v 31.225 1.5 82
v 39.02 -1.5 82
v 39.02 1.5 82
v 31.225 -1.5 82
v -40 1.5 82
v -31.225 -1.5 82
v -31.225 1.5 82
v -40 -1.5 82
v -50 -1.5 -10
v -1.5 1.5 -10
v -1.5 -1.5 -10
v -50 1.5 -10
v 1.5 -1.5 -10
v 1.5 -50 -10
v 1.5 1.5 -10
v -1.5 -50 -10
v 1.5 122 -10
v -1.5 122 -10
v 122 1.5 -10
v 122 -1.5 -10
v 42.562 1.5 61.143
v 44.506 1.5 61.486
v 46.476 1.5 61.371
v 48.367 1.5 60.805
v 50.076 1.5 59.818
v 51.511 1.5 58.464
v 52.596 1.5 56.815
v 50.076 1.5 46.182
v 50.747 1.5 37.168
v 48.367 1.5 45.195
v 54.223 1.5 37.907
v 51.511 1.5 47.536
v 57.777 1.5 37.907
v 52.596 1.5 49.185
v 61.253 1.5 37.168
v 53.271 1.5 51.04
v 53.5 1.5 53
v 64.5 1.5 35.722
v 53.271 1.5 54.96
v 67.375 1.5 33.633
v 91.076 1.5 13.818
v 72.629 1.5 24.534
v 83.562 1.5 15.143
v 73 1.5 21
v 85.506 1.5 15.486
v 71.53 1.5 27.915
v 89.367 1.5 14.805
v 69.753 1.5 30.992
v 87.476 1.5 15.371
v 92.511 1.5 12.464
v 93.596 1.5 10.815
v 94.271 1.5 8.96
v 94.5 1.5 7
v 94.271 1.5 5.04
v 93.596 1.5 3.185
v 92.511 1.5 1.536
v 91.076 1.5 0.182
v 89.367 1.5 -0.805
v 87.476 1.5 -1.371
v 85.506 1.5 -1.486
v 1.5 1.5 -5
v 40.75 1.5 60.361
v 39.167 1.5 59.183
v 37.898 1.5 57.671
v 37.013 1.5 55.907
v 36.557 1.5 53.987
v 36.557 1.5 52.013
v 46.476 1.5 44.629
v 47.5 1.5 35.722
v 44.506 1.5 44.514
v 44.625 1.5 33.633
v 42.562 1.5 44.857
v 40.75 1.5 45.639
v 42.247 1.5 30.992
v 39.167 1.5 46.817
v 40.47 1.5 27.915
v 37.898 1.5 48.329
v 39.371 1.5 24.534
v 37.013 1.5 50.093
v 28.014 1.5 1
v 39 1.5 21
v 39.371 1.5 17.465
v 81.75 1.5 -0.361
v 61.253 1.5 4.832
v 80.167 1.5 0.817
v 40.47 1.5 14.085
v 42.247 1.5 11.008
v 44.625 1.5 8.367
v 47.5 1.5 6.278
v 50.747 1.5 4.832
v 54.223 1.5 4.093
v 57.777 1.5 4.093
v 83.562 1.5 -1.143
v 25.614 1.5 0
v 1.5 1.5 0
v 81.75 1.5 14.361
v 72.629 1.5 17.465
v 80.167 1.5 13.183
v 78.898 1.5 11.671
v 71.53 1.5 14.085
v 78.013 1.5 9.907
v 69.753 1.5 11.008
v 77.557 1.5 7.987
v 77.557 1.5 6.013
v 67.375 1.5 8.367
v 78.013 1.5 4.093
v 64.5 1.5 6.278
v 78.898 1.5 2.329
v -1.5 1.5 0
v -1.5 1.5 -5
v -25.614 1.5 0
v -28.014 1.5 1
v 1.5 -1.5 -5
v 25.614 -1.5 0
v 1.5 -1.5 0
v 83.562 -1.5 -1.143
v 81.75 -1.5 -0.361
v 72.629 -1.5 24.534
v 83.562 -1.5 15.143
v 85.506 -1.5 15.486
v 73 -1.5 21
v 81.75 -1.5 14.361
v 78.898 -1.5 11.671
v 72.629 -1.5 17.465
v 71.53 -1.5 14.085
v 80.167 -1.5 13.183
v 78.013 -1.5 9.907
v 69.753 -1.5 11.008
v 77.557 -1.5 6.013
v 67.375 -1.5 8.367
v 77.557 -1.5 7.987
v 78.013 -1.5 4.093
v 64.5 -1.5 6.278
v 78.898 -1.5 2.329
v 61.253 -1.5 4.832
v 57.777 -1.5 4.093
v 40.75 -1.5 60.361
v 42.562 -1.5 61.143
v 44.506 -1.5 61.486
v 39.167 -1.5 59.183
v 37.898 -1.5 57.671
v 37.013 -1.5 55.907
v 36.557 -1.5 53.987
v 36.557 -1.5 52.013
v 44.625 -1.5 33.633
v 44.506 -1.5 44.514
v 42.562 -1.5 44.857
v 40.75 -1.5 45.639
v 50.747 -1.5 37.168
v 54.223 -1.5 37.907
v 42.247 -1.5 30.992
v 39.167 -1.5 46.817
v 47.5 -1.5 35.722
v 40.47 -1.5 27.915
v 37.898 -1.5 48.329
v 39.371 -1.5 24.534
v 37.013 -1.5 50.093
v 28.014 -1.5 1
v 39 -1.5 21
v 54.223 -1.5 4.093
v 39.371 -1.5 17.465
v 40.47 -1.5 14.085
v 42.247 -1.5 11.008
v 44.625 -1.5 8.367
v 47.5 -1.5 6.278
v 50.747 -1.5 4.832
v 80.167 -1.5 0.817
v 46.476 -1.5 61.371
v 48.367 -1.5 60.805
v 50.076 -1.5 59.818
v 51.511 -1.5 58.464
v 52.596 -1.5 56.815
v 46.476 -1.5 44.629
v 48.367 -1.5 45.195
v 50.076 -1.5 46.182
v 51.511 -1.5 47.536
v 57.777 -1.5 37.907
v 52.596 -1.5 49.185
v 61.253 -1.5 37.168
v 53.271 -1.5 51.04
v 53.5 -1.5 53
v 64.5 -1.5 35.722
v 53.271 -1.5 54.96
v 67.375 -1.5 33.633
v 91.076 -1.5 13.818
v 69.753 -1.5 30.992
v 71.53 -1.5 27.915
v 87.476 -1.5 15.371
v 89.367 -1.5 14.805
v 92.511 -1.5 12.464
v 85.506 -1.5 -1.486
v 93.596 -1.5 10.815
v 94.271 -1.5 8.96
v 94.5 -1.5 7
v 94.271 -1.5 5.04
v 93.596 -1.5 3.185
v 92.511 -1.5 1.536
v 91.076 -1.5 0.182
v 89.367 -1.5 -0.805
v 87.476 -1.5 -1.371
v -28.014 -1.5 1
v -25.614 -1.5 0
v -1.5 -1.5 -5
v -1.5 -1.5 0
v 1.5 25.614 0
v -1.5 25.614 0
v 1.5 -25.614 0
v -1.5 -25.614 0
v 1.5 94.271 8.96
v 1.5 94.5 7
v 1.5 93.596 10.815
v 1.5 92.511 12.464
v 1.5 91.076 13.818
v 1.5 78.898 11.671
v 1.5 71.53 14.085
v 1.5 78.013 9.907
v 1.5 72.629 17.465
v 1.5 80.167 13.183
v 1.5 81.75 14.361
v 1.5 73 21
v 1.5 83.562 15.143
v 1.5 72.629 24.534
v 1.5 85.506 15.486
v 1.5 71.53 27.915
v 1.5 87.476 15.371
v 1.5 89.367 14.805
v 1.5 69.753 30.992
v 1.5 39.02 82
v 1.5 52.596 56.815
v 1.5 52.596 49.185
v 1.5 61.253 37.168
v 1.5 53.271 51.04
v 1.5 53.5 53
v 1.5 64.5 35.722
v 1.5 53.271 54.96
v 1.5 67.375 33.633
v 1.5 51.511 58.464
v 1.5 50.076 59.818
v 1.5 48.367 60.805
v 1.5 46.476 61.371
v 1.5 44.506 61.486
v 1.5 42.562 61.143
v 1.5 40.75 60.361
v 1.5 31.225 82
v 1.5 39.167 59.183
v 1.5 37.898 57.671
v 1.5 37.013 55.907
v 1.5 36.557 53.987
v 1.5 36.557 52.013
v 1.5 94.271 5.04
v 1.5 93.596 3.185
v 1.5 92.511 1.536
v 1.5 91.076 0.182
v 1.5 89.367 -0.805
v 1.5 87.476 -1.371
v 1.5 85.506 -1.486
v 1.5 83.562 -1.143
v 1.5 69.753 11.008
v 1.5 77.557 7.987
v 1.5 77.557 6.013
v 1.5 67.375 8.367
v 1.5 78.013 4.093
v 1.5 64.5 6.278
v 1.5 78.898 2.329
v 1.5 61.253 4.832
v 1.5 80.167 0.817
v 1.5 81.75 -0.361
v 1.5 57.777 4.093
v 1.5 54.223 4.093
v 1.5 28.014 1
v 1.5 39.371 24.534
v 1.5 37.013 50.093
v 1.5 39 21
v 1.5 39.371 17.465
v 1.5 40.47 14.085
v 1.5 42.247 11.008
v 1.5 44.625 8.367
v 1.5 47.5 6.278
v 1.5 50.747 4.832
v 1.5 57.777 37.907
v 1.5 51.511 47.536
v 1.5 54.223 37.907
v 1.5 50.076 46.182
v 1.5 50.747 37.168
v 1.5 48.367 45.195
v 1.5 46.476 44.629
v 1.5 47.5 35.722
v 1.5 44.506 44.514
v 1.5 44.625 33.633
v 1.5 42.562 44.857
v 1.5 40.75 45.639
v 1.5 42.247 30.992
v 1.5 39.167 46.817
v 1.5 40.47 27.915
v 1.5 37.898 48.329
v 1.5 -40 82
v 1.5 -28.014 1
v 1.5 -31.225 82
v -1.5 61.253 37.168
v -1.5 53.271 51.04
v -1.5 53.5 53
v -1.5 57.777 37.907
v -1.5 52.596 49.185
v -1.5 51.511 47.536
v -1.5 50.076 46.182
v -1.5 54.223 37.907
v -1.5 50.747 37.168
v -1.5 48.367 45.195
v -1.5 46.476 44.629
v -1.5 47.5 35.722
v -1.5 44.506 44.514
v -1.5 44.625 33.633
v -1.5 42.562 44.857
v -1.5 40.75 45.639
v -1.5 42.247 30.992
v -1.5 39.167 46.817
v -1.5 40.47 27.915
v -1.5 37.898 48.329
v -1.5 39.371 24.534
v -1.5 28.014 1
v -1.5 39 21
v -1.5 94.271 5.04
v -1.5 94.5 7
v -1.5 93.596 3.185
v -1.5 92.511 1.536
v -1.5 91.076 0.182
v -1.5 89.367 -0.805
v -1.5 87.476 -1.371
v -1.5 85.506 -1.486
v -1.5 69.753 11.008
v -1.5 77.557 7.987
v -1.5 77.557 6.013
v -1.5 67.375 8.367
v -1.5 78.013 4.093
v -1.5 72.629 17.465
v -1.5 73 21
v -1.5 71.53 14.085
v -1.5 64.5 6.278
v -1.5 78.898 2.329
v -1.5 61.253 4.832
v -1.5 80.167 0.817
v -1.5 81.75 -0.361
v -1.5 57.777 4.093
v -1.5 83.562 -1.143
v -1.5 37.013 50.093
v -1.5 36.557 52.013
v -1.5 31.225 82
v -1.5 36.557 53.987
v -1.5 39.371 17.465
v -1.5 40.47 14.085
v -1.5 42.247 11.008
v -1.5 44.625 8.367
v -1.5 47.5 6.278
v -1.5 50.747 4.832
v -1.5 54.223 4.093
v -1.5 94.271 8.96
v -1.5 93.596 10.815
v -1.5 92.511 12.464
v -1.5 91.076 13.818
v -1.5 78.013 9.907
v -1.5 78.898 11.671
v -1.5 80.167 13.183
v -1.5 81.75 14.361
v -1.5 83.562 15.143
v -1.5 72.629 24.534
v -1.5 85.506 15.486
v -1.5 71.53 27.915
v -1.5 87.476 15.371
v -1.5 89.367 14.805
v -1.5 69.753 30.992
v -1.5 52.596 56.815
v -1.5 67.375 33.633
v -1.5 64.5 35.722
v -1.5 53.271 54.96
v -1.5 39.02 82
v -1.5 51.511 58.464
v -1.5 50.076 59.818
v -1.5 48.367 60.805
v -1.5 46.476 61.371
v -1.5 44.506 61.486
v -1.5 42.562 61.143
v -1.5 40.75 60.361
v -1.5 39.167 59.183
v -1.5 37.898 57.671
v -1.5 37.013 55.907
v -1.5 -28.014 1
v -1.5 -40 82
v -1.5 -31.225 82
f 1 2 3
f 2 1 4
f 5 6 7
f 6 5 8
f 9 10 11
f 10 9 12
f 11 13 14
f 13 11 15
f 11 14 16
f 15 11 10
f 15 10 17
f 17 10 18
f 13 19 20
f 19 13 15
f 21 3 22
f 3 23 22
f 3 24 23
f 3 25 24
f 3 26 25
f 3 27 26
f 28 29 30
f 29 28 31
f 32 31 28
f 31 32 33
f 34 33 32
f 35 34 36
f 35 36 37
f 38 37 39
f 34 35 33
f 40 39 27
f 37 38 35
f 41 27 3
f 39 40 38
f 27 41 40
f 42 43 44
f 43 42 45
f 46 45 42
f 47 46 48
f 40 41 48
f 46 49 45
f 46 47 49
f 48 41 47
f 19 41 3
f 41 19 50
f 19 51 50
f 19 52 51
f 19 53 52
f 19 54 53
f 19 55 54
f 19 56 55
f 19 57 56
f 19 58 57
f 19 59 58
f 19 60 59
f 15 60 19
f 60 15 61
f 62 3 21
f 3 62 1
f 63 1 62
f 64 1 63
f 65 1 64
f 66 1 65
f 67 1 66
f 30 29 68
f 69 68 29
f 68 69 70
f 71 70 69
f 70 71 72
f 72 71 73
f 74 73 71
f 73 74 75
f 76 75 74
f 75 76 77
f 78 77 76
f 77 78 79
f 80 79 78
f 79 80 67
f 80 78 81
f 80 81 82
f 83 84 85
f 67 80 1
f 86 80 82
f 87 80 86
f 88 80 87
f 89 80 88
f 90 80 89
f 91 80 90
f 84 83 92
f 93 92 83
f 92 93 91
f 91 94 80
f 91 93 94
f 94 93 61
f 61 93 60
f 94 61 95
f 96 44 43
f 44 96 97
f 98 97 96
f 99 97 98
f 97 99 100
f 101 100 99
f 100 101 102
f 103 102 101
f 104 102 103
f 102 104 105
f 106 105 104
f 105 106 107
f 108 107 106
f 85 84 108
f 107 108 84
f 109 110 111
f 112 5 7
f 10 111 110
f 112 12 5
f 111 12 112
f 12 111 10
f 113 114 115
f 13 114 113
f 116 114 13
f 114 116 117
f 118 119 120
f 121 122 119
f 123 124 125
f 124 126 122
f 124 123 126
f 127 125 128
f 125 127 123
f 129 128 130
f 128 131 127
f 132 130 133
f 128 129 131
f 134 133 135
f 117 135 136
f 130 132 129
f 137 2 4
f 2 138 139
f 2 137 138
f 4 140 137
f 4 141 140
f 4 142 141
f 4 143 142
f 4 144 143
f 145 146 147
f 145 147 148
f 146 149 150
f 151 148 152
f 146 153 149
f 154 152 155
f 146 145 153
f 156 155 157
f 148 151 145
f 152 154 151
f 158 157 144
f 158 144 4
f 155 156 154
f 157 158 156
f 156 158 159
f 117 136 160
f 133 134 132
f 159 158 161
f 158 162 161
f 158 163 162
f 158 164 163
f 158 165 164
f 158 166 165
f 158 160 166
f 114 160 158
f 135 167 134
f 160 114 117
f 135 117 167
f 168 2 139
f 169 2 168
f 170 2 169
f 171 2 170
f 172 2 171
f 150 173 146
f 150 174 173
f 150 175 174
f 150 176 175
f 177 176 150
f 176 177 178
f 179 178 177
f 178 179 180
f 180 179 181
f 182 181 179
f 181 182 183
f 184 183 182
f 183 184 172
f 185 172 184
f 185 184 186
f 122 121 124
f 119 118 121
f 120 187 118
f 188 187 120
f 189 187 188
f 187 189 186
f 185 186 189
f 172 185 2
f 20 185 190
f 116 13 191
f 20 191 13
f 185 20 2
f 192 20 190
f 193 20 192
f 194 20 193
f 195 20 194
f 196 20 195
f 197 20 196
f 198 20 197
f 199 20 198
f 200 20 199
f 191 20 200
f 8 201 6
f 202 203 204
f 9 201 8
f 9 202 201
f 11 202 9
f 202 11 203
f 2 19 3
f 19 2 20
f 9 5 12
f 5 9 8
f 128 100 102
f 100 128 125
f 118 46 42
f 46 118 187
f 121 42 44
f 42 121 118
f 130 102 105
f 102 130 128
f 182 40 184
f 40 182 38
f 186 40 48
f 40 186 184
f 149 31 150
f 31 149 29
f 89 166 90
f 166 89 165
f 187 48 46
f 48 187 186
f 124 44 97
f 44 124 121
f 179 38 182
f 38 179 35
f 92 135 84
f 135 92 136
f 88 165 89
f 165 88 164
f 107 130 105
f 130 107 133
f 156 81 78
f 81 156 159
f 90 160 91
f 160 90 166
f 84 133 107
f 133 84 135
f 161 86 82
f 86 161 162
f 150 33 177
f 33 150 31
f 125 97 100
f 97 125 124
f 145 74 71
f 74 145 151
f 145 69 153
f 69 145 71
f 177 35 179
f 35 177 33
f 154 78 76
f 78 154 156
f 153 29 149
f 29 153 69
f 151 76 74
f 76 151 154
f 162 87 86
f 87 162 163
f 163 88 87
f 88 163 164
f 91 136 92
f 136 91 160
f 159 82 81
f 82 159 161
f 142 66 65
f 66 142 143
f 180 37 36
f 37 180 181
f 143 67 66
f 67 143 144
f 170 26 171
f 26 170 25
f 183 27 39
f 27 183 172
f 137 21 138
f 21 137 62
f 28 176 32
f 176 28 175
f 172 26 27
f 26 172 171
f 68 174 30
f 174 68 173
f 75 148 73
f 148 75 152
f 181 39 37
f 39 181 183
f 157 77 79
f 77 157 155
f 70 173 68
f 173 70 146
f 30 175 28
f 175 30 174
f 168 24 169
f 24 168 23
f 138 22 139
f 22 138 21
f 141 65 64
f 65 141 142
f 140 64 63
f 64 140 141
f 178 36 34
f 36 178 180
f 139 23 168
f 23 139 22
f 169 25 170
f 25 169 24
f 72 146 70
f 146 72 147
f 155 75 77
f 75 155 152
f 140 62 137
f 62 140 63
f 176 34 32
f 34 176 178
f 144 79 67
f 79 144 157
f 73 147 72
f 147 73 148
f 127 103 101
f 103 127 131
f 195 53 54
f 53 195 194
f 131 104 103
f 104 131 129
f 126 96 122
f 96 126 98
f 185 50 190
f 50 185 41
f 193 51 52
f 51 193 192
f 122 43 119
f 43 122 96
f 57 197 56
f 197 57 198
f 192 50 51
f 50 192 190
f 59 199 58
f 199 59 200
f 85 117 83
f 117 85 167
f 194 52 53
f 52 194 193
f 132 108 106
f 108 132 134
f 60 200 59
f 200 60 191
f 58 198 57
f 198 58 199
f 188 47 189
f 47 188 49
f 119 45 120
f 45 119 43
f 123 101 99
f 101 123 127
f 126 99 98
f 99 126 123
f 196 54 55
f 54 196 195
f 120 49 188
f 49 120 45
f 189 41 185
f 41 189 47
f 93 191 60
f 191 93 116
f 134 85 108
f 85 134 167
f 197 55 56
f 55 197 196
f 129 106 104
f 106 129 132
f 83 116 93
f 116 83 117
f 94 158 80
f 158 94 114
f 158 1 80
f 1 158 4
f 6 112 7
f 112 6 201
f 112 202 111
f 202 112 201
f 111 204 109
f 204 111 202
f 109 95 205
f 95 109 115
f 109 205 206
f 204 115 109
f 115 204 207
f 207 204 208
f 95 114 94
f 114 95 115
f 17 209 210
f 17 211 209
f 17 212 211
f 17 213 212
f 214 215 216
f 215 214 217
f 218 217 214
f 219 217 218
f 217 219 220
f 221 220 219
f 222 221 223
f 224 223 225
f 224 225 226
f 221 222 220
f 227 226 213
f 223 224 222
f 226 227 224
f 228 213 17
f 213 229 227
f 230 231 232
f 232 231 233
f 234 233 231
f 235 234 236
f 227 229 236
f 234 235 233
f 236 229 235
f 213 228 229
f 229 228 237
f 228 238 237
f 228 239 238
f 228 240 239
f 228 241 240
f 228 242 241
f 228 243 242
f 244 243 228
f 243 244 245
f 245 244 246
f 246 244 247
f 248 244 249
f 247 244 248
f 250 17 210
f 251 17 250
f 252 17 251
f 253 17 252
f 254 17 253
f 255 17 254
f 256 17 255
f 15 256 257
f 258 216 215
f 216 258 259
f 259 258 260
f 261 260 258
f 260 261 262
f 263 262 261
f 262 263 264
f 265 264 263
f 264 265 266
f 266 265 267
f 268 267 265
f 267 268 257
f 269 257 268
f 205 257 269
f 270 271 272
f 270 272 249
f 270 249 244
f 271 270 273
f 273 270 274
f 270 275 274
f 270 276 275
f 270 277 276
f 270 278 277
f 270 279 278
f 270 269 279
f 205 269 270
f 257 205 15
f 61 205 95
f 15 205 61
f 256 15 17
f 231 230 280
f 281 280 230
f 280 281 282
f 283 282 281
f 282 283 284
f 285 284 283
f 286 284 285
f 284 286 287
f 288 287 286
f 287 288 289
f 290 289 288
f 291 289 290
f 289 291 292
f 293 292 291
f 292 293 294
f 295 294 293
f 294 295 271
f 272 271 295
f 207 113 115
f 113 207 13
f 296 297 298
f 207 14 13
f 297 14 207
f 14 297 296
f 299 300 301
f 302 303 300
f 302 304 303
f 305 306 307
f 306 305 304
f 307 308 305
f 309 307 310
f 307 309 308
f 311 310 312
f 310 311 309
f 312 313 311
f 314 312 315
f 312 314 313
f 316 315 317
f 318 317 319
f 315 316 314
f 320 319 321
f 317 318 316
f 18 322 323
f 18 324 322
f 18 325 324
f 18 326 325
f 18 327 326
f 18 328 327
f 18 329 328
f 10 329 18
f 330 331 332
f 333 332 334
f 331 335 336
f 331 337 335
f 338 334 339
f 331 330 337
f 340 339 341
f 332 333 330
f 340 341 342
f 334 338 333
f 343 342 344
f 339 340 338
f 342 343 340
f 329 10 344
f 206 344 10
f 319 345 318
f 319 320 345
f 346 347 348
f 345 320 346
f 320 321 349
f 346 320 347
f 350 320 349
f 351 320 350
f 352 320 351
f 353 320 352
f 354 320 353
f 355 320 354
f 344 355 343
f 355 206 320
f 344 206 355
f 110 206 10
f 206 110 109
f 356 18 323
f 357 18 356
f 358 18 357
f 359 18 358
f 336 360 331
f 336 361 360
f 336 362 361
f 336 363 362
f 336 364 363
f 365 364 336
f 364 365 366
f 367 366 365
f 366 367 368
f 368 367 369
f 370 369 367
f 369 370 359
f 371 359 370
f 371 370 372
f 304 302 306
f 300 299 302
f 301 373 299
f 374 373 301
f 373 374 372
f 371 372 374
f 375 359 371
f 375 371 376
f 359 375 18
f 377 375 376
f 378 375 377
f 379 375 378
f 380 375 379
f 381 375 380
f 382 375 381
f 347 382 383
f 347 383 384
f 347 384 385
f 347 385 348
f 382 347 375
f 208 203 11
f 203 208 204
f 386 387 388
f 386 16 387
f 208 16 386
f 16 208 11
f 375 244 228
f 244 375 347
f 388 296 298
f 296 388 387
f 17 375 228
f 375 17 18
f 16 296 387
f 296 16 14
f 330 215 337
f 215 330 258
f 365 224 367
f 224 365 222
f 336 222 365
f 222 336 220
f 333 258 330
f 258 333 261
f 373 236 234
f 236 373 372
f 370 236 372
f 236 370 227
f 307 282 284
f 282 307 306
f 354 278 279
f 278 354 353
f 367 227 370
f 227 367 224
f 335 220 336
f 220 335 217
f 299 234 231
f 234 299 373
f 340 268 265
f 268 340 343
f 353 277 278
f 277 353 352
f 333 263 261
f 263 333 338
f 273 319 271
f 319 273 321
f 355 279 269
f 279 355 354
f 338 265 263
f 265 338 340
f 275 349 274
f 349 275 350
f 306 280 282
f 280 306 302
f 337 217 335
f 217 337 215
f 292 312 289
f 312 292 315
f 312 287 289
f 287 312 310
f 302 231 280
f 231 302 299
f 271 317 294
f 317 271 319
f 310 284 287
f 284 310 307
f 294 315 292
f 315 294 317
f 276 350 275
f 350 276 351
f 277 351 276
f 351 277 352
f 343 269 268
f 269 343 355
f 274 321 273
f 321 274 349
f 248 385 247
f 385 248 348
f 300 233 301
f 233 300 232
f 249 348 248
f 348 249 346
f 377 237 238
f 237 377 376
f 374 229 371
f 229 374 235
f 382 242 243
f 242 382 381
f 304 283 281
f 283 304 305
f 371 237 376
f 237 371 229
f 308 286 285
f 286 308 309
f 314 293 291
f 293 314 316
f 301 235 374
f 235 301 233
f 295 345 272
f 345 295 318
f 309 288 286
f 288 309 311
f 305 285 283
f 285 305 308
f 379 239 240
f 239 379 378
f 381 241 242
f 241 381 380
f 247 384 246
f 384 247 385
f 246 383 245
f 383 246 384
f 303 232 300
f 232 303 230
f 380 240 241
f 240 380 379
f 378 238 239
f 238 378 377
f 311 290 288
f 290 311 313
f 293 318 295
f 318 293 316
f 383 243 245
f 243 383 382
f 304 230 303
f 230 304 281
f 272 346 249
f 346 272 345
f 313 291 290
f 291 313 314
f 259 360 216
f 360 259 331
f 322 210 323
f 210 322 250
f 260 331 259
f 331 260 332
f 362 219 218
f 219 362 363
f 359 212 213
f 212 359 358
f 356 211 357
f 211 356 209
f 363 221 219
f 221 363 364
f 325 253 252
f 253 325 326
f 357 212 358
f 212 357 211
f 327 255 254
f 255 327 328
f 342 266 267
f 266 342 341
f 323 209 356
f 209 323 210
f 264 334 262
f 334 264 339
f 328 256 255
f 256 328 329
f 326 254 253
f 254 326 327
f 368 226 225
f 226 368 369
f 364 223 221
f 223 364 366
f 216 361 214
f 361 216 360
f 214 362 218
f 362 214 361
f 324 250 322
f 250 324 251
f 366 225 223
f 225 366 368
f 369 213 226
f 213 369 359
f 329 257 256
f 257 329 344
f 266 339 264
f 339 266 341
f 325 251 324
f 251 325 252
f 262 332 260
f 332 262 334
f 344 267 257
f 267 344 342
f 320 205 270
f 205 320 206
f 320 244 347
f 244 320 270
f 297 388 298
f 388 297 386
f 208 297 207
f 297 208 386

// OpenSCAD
bottom_w = 47;
bottom_diag = 61;
top_w = 60;
top_diag = 75;
height = 82;

bottom_exp_diag = 2 * bottom_w / 2 /sqrt(2);
top_exp_diag = 2 * top_w / 2 /sqrt(2);

bottom_or = abs(bottom_exp_diag - bottom_diag) / 2;
top_or = abs(top_exp_diag - top_diag) / 2;

echo(top_w=top_w, top_diag=top_diag, bottom_w=bottom_w, bottom_exp_diag=bottom_exp_diag,
    bottom_or=bottom_or, top_or=top_or);

module minipot() {
    rotate([0, 0, 45])
        minkowski() {
            cylinder($fn=4, h=height, r1=bottom_diag/2 - bottom_or, r2=top_diag/2 - top_or);
            cylinder(r1=bottom_or, r2=top_or);
        }
}

// ! minipot();

th = 3;
lift = 10;
brace_h = height + lift;
brace_ext = 10;
brace_w = top_w + 2*brace_ext + brace_h;

module brace_arm() {
    difference() {
        translate([brace_w/2 - top_w/2 - 2*brace_ext, 0, brace_h/2 - lift])
            cube([brace_w, th, brace_h], center=true);
        translate([brace_w -top_w/2 - brace_ext*2, -th, -lift])
            rotate([0, -atan(brace_h / (brace_w - top_w - 1 * brace_ext)), 0])
            cube([brace_h *2, th*2, brace_h*2]);
        translate([-top_w/2 - brace_ext*2, th, -lift])
            rotate([0, 90-atan(brace_h / brace_ext), 0])
            rotate([0, 0, 180])
            cube([brace_ext*2, th*2, brace_h + brace_ext]);
        translate([(brace_w - top_w)/2, 0, 21])
            rotate([90, 0, 0])
            cylinder(r=17, h=th*2, center=true);
        translate([(brace_w - top_w)/2 - 11, 0, 53])
            rotate([90, 0, 0])
            cylinder(r=17/2, h=th*2, center=true);
        translate([(brace_w - top_w)/2 + 30, 0, 7])
            rotate([90, 0, 0])
            cylinder(r=17/2, h=th*2, center=true);
        minipot();

    }
}

module x_arm() {
    difference() {
        brace_arm();
        translate([0, 0, -lift/4])
            cube([th, th*2, lift/2], center=true);
    }
}

// ! x_arm();

module y_arm() {
    rotate([0, 0, 90]) {
        difference() {
            brace_arm();
            translate([0, 0, -3*lift/4])
                cube([th, th*2, lift/2], center=true);
        }
    }
}

// ! y_arm();

module plate() {
    translate([0, 0, 0])
        rotate([90, 0, 0])
        x_arm();
    translate([165, -height + lift, 0])
        rotate([0, 90, 90])
        y_arm();
}

// ! projection() plate();

module design() {
    // % minipot();
    x_arm();
    y_arm();
}

design();
